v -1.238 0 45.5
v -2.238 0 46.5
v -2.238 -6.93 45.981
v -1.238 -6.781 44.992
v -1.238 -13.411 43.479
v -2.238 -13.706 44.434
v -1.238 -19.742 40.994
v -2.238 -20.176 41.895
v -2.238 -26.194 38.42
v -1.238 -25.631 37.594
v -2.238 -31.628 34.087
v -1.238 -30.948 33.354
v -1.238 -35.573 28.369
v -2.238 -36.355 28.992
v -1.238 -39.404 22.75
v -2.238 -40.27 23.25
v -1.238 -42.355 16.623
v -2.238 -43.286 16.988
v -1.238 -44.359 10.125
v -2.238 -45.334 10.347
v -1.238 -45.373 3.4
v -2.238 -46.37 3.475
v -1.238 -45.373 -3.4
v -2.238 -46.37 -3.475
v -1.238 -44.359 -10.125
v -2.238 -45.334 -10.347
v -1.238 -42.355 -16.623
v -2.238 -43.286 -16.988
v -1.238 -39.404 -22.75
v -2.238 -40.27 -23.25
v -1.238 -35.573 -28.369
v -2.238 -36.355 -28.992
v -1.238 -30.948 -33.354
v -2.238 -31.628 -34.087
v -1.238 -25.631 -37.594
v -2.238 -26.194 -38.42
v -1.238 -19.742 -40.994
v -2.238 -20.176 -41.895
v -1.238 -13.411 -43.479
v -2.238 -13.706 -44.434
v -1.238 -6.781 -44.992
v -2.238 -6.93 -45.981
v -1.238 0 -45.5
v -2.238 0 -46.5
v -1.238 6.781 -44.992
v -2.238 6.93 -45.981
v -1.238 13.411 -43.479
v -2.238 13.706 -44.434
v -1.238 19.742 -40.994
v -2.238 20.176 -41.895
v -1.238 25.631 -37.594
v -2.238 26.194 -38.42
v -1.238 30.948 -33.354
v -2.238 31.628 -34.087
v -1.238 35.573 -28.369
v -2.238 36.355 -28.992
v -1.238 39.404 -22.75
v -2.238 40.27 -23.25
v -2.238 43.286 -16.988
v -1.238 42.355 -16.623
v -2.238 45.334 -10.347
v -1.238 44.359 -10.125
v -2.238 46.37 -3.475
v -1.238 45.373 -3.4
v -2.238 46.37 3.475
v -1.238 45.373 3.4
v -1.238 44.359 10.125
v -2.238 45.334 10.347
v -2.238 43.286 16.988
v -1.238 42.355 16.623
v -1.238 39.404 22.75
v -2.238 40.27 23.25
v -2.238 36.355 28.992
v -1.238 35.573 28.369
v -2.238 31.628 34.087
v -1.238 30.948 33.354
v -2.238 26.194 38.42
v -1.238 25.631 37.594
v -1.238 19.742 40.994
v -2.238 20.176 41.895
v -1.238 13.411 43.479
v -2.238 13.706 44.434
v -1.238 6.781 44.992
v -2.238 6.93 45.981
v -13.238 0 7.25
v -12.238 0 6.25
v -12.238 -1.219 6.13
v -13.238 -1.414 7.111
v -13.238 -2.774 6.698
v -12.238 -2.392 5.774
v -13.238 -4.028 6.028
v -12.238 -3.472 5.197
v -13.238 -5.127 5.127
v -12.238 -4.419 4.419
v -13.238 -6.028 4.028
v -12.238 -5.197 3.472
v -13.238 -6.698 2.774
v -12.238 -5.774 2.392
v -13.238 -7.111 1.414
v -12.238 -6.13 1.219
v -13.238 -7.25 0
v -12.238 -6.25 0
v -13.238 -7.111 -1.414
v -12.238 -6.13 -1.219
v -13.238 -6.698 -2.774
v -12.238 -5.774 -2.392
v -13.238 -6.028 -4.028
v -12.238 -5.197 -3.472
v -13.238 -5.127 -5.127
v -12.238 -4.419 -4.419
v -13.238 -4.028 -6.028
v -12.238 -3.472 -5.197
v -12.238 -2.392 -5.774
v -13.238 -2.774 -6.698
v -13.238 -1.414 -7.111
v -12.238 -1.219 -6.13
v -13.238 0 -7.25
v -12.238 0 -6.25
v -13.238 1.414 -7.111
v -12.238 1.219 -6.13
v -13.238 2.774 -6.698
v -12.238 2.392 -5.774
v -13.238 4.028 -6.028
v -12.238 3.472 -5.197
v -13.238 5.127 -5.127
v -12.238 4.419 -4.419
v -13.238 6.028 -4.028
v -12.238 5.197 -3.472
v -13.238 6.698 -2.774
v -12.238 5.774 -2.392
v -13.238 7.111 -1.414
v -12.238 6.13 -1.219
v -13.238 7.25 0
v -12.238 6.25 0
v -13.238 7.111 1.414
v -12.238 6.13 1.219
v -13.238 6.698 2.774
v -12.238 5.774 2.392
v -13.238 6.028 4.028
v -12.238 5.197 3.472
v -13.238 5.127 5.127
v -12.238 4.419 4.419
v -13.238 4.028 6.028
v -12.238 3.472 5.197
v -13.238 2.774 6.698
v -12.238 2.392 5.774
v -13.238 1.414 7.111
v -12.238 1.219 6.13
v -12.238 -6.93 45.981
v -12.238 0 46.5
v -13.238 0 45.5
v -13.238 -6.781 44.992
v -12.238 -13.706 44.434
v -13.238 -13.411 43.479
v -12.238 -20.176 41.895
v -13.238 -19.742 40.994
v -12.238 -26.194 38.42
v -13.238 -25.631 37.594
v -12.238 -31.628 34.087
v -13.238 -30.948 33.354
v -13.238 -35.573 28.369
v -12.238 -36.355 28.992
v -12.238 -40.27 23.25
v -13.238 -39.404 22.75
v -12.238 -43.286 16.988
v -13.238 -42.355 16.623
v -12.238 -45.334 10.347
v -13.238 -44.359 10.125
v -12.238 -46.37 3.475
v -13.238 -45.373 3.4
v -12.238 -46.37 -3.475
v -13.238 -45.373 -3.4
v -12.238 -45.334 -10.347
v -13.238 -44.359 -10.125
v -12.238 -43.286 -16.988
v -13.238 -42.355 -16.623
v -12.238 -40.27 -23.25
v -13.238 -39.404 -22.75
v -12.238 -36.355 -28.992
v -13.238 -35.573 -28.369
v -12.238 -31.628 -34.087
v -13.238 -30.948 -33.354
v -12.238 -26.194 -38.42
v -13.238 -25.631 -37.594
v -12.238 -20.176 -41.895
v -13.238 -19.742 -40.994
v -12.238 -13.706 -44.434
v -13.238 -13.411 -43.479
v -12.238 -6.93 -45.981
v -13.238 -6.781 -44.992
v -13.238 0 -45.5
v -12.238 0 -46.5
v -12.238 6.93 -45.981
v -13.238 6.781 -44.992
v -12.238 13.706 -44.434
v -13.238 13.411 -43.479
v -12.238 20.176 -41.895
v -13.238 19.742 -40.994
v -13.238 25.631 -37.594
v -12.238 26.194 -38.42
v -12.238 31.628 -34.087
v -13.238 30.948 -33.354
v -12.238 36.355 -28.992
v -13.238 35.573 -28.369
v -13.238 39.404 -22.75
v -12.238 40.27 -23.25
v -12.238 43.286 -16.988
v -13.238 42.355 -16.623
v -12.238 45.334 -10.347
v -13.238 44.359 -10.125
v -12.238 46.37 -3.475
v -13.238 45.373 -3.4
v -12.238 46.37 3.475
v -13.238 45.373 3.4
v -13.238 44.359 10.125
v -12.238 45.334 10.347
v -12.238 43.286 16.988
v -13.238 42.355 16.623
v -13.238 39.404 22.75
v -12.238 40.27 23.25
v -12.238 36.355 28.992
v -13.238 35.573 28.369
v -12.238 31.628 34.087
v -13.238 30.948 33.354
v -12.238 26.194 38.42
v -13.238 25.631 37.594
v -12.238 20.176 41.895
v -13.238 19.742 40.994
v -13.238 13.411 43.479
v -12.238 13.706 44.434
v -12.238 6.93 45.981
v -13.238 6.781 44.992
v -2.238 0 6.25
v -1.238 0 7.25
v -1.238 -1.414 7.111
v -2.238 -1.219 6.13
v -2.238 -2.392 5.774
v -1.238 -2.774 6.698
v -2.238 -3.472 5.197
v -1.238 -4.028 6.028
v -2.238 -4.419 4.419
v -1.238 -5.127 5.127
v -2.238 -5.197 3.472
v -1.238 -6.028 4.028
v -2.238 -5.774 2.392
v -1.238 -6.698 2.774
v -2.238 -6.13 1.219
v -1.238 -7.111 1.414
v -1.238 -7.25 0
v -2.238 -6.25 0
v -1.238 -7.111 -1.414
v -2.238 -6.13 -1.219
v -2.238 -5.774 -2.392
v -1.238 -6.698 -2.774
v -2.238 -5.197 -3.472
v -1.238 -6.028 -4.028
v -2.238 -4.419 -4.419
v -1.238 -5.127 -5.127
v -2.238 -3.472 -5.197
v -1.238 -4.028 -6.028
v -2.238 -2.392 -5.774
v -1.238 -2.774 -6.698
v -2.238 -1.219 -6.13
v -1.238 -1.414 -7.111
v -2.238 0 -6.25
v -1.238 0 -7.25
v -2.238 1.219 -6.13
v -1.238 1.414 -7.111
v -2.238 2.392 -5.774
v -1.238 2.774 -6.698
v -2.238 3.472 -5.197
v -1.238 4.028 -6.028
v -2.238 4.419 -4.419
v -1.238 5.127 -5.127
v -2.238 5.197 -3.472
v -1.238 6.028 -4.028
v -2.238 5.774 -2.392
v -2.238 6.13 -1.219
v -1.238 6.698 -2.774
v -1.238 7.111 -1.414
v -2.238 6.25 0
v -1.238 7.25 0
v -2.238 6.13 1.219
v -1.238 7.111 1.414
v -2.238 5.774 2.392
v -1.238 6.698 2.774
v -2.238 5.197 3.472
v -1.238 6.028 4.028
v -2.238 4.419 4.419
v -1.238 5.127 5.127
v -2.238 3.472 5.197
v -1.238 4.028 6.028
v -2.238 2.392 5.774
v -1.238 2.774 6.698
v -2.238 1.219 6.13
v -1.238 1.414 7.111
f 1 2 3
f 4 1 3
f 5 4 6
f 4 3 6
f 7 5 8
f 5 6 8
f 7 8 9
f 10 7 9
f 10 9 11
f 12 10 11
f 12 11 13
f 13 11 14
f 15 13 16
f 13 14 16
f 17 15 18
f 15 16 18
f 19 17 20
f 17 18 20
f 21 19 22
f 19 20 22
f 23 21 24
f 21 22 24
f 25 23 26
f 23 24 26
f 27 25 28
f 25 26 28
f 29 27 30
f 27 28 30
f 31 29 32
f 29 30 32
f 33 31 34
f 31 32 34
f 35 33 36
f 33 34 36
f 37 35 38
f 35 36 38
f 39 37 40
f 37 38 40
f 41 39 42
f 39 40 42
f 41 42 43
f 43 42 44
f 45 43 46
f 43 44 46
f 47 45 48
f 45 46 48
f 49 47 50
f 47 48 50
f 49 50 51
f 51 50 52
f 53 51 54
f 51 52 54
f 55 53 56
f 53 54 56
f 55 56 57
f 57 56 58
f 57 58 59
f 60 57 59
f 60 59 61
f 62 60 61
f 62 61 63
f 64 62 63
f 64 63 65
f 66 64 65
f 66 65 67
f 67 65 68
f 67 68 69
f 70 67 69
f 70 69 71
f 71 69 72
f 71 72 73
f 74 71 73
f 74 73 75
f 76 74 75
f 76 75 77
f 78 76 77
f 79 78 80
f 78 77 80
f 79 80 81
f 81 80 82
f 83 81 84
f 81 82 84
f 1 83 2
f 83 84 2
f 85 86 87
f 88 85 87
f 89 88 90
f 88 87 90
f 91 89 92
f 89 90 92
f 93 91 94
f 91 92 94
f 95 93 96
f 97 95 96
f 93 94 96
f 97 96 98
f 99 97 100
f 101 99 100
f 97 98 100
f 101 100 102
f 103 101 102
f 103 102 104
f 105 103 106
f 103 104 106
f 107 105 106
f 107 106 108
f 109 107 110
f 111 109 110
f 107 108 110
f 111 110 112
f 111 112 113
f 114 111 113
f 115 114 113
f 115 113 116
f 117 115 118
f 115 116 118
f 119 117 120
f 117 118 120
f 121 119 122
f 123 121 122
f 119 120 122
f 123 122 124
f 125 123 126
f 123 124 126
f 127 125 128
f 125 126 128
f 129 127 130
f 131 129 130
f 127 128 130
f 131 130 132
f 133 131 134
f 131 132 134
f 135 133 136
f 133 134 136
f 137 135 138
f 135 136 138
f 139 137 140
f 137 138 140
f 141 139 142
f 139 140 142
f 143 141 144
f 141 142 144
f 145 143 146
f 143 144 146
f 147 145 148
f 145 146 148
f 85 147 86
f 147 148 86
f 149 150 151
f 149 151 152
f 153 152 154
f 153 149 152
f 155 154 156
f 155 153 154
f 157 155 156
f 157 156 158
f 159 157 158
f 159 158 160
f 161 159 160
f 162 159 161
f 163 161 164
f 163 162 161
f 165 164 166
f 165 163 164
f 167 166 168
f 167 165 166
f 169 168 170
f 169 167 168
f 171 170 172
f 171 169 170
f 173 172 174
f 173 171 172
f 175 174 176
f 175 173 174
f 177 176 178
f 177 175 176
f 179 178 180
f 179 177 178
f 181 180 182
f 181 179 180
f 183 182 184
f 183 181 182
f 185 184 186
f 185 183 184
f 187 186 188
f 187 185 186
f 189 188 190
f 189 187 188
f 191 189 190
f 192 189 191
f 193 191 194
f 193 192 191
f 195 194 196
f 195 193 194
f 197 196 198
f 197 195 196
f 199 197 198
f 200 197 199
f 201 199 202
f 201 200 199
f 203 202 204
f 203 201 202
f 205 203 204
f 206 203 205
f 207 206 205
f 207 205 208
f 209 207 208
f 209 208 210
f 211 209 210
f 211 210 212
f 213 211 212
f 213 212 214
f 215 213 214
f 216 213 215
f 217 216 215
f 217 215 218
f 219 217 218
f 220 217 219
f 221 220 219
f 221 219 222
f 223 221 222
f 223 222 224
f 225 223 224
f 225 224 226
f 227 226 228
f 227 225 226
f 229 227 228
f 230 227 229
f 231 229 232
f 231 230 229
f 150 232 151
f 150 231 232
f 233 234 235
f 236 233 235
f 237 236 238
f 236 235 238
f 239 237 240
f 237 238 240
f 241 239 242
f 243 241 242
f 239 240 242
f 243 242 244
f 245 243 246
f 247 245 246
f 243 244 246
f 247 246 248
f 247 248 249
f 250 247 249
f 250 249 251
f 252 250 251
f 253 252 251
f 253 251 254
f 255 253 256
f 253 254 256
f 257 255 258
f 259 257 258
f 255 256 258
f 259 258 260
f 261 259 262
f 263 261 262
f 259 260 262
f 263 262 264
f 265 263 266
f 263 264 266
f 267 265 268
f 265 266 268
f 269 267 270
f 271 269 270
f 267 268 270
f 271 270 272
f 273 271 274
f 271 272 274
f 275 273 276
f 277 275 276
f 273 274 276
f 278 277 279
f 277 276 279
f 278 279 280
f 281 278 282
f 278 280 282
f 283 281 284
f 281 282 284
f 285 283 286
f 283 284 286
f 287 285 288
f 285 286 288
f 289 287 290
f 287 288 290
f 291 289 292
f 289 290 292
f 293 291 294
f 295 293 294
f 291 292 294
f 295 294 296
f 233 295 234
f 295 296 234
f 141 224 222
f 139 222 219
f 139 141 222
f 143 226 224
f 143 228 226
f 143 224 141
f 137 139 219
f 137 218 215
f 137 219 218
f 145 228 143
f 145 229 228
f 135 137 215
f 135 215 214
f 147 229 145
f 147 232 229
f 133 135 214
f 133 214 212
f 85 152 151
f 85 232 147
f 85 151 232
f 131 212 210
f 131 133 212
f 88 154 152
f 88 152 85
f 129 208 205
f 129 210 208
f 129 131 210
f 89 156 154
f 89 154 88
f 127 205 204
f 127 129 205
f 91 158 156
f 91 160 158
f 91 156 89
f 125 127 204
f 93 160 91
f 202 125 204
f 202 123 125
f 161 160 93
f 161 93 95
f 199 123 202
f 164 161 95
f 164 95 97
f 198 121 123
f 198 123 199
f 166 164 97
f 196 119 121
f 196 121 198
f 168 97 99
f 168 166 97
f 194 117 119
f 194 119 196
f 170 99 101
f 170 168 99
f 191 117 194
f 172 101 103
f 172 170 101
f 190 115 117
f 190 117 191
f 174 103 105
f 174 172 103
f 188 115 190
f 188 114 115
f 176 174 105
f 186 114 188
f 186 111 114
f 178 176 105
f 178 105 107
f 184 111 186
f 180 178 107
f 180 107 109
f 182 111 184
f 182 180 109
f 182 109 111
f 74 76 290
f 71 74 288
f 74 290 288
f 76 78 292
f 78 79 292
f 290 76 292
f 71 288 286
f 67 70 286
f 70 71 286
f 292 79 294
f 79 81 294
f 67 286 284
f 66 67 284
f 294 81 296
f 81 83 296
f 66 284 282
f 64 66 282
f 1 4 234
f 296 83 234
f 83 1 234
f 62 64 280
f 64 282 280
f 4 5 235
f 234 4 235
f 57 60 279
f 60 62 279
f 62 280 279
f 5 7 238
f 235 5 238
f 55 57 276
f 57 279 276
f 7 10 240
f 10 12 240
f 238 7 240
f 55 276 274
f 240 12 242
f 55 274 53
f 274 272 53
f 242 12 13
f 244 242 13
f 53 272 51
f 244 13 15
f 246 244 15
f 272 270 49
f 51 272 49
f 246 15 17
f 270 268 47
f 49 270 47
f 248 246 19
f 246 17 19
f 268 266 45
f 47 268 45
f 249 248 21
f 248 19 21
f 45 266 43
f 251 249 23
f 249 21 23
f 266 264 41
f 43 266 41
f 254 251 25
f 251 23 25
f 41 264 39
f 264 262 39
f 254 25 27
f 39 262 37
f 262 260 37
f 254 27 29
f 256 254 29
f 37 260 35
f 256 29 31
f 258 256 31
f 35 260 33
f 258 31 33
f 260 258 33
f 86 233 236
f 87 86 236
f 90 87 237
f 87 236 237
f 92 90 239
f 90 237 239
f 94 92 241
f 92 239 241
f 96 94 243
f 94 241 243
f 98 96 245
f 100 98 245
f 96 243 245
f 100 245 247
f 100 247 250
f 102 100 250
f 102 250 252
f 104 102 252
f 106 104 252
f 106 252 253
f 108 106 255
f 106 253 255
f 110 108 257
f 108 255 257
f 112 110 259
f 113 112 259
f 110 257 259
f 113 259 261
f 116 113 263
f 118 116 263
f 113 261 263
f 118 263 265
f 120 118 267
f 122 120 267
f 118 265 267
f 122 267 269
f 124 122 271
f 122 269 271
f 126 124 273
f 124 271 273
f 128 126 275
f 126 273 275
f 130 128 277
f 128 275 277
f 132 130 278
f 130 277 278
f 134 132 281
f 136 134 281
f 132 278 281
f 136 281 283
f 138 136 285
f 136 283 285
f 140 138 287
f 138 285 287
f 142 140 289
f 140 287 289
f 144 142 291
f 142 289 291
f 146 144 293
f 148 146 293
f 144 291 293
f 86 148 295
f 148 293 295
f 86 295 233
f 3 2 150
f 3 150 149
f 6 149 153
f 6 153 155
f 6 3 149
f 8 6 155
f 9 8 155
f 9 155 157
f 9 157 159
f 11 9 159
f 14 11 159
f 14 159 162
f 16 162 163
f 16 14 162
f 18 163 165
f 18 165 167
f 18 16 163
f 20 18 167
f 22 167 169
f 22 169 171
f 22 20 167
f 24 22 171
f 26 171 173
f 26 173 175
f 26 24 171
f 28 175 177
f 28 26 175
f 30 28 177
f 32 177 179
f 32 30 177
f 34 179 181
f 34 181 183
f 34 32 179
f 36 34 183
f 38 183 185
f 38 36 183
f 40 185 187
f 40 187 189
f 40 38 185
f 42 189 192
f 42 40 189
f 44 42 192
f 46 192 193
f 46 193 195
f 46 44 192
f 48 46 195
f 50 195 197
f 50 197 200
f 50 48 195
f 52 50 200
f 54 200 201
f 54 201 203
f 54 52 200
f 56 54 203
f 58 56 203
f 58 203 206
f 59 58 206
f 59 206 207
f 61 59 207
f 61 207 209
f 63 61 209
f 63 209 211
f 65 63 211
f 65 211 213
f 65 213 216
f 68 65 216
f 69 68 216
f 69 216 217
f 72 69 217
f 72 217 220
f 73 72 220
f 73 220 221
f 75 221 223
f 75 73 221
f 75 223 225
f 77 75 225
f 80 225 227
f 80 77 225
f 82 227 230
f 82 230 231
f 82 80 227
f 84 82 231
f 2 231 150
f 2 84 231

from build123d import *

# Parameters (mm, degrees)
SKETCH1_W        = 12
SKETCH1_H        = 40.25
SFAZOWANIE1_SIZE = 1


with BuildPart() as part:
    # Sketch1 → Base-Revolve (revolve)
    with BuildSketch(Plane.XY, mode=Mode.PRIVATE) as base_revolve_sk:
        with Locations((-7.238439554, 26.375)):
            Rectangle(SKETCH1_W, SKETCH1_H)
    revolve(base_revolve_sk.sketch.rotate(Axis((-17.903027245, 0, 0), (1, 0, 0)), 90), axis=Axis((-17.903027245, 0, 0), (1, 0, 0)))

    # Sfazowanie1
    sfazowanie1_edges = [part.edges().sort_by_distance(p)[0] for p in [
        (-1.238439554, 0, -6.25),
        (-1.238439554, 0, -46.5),
        (-13.238439554, 0, -46.5),
        (-13.238439554, 0, -6.25),
    ]]
    chamfer(sfazowanie1_edges, length=SFAZOWANIE1_SIZE)


solid = part.part
